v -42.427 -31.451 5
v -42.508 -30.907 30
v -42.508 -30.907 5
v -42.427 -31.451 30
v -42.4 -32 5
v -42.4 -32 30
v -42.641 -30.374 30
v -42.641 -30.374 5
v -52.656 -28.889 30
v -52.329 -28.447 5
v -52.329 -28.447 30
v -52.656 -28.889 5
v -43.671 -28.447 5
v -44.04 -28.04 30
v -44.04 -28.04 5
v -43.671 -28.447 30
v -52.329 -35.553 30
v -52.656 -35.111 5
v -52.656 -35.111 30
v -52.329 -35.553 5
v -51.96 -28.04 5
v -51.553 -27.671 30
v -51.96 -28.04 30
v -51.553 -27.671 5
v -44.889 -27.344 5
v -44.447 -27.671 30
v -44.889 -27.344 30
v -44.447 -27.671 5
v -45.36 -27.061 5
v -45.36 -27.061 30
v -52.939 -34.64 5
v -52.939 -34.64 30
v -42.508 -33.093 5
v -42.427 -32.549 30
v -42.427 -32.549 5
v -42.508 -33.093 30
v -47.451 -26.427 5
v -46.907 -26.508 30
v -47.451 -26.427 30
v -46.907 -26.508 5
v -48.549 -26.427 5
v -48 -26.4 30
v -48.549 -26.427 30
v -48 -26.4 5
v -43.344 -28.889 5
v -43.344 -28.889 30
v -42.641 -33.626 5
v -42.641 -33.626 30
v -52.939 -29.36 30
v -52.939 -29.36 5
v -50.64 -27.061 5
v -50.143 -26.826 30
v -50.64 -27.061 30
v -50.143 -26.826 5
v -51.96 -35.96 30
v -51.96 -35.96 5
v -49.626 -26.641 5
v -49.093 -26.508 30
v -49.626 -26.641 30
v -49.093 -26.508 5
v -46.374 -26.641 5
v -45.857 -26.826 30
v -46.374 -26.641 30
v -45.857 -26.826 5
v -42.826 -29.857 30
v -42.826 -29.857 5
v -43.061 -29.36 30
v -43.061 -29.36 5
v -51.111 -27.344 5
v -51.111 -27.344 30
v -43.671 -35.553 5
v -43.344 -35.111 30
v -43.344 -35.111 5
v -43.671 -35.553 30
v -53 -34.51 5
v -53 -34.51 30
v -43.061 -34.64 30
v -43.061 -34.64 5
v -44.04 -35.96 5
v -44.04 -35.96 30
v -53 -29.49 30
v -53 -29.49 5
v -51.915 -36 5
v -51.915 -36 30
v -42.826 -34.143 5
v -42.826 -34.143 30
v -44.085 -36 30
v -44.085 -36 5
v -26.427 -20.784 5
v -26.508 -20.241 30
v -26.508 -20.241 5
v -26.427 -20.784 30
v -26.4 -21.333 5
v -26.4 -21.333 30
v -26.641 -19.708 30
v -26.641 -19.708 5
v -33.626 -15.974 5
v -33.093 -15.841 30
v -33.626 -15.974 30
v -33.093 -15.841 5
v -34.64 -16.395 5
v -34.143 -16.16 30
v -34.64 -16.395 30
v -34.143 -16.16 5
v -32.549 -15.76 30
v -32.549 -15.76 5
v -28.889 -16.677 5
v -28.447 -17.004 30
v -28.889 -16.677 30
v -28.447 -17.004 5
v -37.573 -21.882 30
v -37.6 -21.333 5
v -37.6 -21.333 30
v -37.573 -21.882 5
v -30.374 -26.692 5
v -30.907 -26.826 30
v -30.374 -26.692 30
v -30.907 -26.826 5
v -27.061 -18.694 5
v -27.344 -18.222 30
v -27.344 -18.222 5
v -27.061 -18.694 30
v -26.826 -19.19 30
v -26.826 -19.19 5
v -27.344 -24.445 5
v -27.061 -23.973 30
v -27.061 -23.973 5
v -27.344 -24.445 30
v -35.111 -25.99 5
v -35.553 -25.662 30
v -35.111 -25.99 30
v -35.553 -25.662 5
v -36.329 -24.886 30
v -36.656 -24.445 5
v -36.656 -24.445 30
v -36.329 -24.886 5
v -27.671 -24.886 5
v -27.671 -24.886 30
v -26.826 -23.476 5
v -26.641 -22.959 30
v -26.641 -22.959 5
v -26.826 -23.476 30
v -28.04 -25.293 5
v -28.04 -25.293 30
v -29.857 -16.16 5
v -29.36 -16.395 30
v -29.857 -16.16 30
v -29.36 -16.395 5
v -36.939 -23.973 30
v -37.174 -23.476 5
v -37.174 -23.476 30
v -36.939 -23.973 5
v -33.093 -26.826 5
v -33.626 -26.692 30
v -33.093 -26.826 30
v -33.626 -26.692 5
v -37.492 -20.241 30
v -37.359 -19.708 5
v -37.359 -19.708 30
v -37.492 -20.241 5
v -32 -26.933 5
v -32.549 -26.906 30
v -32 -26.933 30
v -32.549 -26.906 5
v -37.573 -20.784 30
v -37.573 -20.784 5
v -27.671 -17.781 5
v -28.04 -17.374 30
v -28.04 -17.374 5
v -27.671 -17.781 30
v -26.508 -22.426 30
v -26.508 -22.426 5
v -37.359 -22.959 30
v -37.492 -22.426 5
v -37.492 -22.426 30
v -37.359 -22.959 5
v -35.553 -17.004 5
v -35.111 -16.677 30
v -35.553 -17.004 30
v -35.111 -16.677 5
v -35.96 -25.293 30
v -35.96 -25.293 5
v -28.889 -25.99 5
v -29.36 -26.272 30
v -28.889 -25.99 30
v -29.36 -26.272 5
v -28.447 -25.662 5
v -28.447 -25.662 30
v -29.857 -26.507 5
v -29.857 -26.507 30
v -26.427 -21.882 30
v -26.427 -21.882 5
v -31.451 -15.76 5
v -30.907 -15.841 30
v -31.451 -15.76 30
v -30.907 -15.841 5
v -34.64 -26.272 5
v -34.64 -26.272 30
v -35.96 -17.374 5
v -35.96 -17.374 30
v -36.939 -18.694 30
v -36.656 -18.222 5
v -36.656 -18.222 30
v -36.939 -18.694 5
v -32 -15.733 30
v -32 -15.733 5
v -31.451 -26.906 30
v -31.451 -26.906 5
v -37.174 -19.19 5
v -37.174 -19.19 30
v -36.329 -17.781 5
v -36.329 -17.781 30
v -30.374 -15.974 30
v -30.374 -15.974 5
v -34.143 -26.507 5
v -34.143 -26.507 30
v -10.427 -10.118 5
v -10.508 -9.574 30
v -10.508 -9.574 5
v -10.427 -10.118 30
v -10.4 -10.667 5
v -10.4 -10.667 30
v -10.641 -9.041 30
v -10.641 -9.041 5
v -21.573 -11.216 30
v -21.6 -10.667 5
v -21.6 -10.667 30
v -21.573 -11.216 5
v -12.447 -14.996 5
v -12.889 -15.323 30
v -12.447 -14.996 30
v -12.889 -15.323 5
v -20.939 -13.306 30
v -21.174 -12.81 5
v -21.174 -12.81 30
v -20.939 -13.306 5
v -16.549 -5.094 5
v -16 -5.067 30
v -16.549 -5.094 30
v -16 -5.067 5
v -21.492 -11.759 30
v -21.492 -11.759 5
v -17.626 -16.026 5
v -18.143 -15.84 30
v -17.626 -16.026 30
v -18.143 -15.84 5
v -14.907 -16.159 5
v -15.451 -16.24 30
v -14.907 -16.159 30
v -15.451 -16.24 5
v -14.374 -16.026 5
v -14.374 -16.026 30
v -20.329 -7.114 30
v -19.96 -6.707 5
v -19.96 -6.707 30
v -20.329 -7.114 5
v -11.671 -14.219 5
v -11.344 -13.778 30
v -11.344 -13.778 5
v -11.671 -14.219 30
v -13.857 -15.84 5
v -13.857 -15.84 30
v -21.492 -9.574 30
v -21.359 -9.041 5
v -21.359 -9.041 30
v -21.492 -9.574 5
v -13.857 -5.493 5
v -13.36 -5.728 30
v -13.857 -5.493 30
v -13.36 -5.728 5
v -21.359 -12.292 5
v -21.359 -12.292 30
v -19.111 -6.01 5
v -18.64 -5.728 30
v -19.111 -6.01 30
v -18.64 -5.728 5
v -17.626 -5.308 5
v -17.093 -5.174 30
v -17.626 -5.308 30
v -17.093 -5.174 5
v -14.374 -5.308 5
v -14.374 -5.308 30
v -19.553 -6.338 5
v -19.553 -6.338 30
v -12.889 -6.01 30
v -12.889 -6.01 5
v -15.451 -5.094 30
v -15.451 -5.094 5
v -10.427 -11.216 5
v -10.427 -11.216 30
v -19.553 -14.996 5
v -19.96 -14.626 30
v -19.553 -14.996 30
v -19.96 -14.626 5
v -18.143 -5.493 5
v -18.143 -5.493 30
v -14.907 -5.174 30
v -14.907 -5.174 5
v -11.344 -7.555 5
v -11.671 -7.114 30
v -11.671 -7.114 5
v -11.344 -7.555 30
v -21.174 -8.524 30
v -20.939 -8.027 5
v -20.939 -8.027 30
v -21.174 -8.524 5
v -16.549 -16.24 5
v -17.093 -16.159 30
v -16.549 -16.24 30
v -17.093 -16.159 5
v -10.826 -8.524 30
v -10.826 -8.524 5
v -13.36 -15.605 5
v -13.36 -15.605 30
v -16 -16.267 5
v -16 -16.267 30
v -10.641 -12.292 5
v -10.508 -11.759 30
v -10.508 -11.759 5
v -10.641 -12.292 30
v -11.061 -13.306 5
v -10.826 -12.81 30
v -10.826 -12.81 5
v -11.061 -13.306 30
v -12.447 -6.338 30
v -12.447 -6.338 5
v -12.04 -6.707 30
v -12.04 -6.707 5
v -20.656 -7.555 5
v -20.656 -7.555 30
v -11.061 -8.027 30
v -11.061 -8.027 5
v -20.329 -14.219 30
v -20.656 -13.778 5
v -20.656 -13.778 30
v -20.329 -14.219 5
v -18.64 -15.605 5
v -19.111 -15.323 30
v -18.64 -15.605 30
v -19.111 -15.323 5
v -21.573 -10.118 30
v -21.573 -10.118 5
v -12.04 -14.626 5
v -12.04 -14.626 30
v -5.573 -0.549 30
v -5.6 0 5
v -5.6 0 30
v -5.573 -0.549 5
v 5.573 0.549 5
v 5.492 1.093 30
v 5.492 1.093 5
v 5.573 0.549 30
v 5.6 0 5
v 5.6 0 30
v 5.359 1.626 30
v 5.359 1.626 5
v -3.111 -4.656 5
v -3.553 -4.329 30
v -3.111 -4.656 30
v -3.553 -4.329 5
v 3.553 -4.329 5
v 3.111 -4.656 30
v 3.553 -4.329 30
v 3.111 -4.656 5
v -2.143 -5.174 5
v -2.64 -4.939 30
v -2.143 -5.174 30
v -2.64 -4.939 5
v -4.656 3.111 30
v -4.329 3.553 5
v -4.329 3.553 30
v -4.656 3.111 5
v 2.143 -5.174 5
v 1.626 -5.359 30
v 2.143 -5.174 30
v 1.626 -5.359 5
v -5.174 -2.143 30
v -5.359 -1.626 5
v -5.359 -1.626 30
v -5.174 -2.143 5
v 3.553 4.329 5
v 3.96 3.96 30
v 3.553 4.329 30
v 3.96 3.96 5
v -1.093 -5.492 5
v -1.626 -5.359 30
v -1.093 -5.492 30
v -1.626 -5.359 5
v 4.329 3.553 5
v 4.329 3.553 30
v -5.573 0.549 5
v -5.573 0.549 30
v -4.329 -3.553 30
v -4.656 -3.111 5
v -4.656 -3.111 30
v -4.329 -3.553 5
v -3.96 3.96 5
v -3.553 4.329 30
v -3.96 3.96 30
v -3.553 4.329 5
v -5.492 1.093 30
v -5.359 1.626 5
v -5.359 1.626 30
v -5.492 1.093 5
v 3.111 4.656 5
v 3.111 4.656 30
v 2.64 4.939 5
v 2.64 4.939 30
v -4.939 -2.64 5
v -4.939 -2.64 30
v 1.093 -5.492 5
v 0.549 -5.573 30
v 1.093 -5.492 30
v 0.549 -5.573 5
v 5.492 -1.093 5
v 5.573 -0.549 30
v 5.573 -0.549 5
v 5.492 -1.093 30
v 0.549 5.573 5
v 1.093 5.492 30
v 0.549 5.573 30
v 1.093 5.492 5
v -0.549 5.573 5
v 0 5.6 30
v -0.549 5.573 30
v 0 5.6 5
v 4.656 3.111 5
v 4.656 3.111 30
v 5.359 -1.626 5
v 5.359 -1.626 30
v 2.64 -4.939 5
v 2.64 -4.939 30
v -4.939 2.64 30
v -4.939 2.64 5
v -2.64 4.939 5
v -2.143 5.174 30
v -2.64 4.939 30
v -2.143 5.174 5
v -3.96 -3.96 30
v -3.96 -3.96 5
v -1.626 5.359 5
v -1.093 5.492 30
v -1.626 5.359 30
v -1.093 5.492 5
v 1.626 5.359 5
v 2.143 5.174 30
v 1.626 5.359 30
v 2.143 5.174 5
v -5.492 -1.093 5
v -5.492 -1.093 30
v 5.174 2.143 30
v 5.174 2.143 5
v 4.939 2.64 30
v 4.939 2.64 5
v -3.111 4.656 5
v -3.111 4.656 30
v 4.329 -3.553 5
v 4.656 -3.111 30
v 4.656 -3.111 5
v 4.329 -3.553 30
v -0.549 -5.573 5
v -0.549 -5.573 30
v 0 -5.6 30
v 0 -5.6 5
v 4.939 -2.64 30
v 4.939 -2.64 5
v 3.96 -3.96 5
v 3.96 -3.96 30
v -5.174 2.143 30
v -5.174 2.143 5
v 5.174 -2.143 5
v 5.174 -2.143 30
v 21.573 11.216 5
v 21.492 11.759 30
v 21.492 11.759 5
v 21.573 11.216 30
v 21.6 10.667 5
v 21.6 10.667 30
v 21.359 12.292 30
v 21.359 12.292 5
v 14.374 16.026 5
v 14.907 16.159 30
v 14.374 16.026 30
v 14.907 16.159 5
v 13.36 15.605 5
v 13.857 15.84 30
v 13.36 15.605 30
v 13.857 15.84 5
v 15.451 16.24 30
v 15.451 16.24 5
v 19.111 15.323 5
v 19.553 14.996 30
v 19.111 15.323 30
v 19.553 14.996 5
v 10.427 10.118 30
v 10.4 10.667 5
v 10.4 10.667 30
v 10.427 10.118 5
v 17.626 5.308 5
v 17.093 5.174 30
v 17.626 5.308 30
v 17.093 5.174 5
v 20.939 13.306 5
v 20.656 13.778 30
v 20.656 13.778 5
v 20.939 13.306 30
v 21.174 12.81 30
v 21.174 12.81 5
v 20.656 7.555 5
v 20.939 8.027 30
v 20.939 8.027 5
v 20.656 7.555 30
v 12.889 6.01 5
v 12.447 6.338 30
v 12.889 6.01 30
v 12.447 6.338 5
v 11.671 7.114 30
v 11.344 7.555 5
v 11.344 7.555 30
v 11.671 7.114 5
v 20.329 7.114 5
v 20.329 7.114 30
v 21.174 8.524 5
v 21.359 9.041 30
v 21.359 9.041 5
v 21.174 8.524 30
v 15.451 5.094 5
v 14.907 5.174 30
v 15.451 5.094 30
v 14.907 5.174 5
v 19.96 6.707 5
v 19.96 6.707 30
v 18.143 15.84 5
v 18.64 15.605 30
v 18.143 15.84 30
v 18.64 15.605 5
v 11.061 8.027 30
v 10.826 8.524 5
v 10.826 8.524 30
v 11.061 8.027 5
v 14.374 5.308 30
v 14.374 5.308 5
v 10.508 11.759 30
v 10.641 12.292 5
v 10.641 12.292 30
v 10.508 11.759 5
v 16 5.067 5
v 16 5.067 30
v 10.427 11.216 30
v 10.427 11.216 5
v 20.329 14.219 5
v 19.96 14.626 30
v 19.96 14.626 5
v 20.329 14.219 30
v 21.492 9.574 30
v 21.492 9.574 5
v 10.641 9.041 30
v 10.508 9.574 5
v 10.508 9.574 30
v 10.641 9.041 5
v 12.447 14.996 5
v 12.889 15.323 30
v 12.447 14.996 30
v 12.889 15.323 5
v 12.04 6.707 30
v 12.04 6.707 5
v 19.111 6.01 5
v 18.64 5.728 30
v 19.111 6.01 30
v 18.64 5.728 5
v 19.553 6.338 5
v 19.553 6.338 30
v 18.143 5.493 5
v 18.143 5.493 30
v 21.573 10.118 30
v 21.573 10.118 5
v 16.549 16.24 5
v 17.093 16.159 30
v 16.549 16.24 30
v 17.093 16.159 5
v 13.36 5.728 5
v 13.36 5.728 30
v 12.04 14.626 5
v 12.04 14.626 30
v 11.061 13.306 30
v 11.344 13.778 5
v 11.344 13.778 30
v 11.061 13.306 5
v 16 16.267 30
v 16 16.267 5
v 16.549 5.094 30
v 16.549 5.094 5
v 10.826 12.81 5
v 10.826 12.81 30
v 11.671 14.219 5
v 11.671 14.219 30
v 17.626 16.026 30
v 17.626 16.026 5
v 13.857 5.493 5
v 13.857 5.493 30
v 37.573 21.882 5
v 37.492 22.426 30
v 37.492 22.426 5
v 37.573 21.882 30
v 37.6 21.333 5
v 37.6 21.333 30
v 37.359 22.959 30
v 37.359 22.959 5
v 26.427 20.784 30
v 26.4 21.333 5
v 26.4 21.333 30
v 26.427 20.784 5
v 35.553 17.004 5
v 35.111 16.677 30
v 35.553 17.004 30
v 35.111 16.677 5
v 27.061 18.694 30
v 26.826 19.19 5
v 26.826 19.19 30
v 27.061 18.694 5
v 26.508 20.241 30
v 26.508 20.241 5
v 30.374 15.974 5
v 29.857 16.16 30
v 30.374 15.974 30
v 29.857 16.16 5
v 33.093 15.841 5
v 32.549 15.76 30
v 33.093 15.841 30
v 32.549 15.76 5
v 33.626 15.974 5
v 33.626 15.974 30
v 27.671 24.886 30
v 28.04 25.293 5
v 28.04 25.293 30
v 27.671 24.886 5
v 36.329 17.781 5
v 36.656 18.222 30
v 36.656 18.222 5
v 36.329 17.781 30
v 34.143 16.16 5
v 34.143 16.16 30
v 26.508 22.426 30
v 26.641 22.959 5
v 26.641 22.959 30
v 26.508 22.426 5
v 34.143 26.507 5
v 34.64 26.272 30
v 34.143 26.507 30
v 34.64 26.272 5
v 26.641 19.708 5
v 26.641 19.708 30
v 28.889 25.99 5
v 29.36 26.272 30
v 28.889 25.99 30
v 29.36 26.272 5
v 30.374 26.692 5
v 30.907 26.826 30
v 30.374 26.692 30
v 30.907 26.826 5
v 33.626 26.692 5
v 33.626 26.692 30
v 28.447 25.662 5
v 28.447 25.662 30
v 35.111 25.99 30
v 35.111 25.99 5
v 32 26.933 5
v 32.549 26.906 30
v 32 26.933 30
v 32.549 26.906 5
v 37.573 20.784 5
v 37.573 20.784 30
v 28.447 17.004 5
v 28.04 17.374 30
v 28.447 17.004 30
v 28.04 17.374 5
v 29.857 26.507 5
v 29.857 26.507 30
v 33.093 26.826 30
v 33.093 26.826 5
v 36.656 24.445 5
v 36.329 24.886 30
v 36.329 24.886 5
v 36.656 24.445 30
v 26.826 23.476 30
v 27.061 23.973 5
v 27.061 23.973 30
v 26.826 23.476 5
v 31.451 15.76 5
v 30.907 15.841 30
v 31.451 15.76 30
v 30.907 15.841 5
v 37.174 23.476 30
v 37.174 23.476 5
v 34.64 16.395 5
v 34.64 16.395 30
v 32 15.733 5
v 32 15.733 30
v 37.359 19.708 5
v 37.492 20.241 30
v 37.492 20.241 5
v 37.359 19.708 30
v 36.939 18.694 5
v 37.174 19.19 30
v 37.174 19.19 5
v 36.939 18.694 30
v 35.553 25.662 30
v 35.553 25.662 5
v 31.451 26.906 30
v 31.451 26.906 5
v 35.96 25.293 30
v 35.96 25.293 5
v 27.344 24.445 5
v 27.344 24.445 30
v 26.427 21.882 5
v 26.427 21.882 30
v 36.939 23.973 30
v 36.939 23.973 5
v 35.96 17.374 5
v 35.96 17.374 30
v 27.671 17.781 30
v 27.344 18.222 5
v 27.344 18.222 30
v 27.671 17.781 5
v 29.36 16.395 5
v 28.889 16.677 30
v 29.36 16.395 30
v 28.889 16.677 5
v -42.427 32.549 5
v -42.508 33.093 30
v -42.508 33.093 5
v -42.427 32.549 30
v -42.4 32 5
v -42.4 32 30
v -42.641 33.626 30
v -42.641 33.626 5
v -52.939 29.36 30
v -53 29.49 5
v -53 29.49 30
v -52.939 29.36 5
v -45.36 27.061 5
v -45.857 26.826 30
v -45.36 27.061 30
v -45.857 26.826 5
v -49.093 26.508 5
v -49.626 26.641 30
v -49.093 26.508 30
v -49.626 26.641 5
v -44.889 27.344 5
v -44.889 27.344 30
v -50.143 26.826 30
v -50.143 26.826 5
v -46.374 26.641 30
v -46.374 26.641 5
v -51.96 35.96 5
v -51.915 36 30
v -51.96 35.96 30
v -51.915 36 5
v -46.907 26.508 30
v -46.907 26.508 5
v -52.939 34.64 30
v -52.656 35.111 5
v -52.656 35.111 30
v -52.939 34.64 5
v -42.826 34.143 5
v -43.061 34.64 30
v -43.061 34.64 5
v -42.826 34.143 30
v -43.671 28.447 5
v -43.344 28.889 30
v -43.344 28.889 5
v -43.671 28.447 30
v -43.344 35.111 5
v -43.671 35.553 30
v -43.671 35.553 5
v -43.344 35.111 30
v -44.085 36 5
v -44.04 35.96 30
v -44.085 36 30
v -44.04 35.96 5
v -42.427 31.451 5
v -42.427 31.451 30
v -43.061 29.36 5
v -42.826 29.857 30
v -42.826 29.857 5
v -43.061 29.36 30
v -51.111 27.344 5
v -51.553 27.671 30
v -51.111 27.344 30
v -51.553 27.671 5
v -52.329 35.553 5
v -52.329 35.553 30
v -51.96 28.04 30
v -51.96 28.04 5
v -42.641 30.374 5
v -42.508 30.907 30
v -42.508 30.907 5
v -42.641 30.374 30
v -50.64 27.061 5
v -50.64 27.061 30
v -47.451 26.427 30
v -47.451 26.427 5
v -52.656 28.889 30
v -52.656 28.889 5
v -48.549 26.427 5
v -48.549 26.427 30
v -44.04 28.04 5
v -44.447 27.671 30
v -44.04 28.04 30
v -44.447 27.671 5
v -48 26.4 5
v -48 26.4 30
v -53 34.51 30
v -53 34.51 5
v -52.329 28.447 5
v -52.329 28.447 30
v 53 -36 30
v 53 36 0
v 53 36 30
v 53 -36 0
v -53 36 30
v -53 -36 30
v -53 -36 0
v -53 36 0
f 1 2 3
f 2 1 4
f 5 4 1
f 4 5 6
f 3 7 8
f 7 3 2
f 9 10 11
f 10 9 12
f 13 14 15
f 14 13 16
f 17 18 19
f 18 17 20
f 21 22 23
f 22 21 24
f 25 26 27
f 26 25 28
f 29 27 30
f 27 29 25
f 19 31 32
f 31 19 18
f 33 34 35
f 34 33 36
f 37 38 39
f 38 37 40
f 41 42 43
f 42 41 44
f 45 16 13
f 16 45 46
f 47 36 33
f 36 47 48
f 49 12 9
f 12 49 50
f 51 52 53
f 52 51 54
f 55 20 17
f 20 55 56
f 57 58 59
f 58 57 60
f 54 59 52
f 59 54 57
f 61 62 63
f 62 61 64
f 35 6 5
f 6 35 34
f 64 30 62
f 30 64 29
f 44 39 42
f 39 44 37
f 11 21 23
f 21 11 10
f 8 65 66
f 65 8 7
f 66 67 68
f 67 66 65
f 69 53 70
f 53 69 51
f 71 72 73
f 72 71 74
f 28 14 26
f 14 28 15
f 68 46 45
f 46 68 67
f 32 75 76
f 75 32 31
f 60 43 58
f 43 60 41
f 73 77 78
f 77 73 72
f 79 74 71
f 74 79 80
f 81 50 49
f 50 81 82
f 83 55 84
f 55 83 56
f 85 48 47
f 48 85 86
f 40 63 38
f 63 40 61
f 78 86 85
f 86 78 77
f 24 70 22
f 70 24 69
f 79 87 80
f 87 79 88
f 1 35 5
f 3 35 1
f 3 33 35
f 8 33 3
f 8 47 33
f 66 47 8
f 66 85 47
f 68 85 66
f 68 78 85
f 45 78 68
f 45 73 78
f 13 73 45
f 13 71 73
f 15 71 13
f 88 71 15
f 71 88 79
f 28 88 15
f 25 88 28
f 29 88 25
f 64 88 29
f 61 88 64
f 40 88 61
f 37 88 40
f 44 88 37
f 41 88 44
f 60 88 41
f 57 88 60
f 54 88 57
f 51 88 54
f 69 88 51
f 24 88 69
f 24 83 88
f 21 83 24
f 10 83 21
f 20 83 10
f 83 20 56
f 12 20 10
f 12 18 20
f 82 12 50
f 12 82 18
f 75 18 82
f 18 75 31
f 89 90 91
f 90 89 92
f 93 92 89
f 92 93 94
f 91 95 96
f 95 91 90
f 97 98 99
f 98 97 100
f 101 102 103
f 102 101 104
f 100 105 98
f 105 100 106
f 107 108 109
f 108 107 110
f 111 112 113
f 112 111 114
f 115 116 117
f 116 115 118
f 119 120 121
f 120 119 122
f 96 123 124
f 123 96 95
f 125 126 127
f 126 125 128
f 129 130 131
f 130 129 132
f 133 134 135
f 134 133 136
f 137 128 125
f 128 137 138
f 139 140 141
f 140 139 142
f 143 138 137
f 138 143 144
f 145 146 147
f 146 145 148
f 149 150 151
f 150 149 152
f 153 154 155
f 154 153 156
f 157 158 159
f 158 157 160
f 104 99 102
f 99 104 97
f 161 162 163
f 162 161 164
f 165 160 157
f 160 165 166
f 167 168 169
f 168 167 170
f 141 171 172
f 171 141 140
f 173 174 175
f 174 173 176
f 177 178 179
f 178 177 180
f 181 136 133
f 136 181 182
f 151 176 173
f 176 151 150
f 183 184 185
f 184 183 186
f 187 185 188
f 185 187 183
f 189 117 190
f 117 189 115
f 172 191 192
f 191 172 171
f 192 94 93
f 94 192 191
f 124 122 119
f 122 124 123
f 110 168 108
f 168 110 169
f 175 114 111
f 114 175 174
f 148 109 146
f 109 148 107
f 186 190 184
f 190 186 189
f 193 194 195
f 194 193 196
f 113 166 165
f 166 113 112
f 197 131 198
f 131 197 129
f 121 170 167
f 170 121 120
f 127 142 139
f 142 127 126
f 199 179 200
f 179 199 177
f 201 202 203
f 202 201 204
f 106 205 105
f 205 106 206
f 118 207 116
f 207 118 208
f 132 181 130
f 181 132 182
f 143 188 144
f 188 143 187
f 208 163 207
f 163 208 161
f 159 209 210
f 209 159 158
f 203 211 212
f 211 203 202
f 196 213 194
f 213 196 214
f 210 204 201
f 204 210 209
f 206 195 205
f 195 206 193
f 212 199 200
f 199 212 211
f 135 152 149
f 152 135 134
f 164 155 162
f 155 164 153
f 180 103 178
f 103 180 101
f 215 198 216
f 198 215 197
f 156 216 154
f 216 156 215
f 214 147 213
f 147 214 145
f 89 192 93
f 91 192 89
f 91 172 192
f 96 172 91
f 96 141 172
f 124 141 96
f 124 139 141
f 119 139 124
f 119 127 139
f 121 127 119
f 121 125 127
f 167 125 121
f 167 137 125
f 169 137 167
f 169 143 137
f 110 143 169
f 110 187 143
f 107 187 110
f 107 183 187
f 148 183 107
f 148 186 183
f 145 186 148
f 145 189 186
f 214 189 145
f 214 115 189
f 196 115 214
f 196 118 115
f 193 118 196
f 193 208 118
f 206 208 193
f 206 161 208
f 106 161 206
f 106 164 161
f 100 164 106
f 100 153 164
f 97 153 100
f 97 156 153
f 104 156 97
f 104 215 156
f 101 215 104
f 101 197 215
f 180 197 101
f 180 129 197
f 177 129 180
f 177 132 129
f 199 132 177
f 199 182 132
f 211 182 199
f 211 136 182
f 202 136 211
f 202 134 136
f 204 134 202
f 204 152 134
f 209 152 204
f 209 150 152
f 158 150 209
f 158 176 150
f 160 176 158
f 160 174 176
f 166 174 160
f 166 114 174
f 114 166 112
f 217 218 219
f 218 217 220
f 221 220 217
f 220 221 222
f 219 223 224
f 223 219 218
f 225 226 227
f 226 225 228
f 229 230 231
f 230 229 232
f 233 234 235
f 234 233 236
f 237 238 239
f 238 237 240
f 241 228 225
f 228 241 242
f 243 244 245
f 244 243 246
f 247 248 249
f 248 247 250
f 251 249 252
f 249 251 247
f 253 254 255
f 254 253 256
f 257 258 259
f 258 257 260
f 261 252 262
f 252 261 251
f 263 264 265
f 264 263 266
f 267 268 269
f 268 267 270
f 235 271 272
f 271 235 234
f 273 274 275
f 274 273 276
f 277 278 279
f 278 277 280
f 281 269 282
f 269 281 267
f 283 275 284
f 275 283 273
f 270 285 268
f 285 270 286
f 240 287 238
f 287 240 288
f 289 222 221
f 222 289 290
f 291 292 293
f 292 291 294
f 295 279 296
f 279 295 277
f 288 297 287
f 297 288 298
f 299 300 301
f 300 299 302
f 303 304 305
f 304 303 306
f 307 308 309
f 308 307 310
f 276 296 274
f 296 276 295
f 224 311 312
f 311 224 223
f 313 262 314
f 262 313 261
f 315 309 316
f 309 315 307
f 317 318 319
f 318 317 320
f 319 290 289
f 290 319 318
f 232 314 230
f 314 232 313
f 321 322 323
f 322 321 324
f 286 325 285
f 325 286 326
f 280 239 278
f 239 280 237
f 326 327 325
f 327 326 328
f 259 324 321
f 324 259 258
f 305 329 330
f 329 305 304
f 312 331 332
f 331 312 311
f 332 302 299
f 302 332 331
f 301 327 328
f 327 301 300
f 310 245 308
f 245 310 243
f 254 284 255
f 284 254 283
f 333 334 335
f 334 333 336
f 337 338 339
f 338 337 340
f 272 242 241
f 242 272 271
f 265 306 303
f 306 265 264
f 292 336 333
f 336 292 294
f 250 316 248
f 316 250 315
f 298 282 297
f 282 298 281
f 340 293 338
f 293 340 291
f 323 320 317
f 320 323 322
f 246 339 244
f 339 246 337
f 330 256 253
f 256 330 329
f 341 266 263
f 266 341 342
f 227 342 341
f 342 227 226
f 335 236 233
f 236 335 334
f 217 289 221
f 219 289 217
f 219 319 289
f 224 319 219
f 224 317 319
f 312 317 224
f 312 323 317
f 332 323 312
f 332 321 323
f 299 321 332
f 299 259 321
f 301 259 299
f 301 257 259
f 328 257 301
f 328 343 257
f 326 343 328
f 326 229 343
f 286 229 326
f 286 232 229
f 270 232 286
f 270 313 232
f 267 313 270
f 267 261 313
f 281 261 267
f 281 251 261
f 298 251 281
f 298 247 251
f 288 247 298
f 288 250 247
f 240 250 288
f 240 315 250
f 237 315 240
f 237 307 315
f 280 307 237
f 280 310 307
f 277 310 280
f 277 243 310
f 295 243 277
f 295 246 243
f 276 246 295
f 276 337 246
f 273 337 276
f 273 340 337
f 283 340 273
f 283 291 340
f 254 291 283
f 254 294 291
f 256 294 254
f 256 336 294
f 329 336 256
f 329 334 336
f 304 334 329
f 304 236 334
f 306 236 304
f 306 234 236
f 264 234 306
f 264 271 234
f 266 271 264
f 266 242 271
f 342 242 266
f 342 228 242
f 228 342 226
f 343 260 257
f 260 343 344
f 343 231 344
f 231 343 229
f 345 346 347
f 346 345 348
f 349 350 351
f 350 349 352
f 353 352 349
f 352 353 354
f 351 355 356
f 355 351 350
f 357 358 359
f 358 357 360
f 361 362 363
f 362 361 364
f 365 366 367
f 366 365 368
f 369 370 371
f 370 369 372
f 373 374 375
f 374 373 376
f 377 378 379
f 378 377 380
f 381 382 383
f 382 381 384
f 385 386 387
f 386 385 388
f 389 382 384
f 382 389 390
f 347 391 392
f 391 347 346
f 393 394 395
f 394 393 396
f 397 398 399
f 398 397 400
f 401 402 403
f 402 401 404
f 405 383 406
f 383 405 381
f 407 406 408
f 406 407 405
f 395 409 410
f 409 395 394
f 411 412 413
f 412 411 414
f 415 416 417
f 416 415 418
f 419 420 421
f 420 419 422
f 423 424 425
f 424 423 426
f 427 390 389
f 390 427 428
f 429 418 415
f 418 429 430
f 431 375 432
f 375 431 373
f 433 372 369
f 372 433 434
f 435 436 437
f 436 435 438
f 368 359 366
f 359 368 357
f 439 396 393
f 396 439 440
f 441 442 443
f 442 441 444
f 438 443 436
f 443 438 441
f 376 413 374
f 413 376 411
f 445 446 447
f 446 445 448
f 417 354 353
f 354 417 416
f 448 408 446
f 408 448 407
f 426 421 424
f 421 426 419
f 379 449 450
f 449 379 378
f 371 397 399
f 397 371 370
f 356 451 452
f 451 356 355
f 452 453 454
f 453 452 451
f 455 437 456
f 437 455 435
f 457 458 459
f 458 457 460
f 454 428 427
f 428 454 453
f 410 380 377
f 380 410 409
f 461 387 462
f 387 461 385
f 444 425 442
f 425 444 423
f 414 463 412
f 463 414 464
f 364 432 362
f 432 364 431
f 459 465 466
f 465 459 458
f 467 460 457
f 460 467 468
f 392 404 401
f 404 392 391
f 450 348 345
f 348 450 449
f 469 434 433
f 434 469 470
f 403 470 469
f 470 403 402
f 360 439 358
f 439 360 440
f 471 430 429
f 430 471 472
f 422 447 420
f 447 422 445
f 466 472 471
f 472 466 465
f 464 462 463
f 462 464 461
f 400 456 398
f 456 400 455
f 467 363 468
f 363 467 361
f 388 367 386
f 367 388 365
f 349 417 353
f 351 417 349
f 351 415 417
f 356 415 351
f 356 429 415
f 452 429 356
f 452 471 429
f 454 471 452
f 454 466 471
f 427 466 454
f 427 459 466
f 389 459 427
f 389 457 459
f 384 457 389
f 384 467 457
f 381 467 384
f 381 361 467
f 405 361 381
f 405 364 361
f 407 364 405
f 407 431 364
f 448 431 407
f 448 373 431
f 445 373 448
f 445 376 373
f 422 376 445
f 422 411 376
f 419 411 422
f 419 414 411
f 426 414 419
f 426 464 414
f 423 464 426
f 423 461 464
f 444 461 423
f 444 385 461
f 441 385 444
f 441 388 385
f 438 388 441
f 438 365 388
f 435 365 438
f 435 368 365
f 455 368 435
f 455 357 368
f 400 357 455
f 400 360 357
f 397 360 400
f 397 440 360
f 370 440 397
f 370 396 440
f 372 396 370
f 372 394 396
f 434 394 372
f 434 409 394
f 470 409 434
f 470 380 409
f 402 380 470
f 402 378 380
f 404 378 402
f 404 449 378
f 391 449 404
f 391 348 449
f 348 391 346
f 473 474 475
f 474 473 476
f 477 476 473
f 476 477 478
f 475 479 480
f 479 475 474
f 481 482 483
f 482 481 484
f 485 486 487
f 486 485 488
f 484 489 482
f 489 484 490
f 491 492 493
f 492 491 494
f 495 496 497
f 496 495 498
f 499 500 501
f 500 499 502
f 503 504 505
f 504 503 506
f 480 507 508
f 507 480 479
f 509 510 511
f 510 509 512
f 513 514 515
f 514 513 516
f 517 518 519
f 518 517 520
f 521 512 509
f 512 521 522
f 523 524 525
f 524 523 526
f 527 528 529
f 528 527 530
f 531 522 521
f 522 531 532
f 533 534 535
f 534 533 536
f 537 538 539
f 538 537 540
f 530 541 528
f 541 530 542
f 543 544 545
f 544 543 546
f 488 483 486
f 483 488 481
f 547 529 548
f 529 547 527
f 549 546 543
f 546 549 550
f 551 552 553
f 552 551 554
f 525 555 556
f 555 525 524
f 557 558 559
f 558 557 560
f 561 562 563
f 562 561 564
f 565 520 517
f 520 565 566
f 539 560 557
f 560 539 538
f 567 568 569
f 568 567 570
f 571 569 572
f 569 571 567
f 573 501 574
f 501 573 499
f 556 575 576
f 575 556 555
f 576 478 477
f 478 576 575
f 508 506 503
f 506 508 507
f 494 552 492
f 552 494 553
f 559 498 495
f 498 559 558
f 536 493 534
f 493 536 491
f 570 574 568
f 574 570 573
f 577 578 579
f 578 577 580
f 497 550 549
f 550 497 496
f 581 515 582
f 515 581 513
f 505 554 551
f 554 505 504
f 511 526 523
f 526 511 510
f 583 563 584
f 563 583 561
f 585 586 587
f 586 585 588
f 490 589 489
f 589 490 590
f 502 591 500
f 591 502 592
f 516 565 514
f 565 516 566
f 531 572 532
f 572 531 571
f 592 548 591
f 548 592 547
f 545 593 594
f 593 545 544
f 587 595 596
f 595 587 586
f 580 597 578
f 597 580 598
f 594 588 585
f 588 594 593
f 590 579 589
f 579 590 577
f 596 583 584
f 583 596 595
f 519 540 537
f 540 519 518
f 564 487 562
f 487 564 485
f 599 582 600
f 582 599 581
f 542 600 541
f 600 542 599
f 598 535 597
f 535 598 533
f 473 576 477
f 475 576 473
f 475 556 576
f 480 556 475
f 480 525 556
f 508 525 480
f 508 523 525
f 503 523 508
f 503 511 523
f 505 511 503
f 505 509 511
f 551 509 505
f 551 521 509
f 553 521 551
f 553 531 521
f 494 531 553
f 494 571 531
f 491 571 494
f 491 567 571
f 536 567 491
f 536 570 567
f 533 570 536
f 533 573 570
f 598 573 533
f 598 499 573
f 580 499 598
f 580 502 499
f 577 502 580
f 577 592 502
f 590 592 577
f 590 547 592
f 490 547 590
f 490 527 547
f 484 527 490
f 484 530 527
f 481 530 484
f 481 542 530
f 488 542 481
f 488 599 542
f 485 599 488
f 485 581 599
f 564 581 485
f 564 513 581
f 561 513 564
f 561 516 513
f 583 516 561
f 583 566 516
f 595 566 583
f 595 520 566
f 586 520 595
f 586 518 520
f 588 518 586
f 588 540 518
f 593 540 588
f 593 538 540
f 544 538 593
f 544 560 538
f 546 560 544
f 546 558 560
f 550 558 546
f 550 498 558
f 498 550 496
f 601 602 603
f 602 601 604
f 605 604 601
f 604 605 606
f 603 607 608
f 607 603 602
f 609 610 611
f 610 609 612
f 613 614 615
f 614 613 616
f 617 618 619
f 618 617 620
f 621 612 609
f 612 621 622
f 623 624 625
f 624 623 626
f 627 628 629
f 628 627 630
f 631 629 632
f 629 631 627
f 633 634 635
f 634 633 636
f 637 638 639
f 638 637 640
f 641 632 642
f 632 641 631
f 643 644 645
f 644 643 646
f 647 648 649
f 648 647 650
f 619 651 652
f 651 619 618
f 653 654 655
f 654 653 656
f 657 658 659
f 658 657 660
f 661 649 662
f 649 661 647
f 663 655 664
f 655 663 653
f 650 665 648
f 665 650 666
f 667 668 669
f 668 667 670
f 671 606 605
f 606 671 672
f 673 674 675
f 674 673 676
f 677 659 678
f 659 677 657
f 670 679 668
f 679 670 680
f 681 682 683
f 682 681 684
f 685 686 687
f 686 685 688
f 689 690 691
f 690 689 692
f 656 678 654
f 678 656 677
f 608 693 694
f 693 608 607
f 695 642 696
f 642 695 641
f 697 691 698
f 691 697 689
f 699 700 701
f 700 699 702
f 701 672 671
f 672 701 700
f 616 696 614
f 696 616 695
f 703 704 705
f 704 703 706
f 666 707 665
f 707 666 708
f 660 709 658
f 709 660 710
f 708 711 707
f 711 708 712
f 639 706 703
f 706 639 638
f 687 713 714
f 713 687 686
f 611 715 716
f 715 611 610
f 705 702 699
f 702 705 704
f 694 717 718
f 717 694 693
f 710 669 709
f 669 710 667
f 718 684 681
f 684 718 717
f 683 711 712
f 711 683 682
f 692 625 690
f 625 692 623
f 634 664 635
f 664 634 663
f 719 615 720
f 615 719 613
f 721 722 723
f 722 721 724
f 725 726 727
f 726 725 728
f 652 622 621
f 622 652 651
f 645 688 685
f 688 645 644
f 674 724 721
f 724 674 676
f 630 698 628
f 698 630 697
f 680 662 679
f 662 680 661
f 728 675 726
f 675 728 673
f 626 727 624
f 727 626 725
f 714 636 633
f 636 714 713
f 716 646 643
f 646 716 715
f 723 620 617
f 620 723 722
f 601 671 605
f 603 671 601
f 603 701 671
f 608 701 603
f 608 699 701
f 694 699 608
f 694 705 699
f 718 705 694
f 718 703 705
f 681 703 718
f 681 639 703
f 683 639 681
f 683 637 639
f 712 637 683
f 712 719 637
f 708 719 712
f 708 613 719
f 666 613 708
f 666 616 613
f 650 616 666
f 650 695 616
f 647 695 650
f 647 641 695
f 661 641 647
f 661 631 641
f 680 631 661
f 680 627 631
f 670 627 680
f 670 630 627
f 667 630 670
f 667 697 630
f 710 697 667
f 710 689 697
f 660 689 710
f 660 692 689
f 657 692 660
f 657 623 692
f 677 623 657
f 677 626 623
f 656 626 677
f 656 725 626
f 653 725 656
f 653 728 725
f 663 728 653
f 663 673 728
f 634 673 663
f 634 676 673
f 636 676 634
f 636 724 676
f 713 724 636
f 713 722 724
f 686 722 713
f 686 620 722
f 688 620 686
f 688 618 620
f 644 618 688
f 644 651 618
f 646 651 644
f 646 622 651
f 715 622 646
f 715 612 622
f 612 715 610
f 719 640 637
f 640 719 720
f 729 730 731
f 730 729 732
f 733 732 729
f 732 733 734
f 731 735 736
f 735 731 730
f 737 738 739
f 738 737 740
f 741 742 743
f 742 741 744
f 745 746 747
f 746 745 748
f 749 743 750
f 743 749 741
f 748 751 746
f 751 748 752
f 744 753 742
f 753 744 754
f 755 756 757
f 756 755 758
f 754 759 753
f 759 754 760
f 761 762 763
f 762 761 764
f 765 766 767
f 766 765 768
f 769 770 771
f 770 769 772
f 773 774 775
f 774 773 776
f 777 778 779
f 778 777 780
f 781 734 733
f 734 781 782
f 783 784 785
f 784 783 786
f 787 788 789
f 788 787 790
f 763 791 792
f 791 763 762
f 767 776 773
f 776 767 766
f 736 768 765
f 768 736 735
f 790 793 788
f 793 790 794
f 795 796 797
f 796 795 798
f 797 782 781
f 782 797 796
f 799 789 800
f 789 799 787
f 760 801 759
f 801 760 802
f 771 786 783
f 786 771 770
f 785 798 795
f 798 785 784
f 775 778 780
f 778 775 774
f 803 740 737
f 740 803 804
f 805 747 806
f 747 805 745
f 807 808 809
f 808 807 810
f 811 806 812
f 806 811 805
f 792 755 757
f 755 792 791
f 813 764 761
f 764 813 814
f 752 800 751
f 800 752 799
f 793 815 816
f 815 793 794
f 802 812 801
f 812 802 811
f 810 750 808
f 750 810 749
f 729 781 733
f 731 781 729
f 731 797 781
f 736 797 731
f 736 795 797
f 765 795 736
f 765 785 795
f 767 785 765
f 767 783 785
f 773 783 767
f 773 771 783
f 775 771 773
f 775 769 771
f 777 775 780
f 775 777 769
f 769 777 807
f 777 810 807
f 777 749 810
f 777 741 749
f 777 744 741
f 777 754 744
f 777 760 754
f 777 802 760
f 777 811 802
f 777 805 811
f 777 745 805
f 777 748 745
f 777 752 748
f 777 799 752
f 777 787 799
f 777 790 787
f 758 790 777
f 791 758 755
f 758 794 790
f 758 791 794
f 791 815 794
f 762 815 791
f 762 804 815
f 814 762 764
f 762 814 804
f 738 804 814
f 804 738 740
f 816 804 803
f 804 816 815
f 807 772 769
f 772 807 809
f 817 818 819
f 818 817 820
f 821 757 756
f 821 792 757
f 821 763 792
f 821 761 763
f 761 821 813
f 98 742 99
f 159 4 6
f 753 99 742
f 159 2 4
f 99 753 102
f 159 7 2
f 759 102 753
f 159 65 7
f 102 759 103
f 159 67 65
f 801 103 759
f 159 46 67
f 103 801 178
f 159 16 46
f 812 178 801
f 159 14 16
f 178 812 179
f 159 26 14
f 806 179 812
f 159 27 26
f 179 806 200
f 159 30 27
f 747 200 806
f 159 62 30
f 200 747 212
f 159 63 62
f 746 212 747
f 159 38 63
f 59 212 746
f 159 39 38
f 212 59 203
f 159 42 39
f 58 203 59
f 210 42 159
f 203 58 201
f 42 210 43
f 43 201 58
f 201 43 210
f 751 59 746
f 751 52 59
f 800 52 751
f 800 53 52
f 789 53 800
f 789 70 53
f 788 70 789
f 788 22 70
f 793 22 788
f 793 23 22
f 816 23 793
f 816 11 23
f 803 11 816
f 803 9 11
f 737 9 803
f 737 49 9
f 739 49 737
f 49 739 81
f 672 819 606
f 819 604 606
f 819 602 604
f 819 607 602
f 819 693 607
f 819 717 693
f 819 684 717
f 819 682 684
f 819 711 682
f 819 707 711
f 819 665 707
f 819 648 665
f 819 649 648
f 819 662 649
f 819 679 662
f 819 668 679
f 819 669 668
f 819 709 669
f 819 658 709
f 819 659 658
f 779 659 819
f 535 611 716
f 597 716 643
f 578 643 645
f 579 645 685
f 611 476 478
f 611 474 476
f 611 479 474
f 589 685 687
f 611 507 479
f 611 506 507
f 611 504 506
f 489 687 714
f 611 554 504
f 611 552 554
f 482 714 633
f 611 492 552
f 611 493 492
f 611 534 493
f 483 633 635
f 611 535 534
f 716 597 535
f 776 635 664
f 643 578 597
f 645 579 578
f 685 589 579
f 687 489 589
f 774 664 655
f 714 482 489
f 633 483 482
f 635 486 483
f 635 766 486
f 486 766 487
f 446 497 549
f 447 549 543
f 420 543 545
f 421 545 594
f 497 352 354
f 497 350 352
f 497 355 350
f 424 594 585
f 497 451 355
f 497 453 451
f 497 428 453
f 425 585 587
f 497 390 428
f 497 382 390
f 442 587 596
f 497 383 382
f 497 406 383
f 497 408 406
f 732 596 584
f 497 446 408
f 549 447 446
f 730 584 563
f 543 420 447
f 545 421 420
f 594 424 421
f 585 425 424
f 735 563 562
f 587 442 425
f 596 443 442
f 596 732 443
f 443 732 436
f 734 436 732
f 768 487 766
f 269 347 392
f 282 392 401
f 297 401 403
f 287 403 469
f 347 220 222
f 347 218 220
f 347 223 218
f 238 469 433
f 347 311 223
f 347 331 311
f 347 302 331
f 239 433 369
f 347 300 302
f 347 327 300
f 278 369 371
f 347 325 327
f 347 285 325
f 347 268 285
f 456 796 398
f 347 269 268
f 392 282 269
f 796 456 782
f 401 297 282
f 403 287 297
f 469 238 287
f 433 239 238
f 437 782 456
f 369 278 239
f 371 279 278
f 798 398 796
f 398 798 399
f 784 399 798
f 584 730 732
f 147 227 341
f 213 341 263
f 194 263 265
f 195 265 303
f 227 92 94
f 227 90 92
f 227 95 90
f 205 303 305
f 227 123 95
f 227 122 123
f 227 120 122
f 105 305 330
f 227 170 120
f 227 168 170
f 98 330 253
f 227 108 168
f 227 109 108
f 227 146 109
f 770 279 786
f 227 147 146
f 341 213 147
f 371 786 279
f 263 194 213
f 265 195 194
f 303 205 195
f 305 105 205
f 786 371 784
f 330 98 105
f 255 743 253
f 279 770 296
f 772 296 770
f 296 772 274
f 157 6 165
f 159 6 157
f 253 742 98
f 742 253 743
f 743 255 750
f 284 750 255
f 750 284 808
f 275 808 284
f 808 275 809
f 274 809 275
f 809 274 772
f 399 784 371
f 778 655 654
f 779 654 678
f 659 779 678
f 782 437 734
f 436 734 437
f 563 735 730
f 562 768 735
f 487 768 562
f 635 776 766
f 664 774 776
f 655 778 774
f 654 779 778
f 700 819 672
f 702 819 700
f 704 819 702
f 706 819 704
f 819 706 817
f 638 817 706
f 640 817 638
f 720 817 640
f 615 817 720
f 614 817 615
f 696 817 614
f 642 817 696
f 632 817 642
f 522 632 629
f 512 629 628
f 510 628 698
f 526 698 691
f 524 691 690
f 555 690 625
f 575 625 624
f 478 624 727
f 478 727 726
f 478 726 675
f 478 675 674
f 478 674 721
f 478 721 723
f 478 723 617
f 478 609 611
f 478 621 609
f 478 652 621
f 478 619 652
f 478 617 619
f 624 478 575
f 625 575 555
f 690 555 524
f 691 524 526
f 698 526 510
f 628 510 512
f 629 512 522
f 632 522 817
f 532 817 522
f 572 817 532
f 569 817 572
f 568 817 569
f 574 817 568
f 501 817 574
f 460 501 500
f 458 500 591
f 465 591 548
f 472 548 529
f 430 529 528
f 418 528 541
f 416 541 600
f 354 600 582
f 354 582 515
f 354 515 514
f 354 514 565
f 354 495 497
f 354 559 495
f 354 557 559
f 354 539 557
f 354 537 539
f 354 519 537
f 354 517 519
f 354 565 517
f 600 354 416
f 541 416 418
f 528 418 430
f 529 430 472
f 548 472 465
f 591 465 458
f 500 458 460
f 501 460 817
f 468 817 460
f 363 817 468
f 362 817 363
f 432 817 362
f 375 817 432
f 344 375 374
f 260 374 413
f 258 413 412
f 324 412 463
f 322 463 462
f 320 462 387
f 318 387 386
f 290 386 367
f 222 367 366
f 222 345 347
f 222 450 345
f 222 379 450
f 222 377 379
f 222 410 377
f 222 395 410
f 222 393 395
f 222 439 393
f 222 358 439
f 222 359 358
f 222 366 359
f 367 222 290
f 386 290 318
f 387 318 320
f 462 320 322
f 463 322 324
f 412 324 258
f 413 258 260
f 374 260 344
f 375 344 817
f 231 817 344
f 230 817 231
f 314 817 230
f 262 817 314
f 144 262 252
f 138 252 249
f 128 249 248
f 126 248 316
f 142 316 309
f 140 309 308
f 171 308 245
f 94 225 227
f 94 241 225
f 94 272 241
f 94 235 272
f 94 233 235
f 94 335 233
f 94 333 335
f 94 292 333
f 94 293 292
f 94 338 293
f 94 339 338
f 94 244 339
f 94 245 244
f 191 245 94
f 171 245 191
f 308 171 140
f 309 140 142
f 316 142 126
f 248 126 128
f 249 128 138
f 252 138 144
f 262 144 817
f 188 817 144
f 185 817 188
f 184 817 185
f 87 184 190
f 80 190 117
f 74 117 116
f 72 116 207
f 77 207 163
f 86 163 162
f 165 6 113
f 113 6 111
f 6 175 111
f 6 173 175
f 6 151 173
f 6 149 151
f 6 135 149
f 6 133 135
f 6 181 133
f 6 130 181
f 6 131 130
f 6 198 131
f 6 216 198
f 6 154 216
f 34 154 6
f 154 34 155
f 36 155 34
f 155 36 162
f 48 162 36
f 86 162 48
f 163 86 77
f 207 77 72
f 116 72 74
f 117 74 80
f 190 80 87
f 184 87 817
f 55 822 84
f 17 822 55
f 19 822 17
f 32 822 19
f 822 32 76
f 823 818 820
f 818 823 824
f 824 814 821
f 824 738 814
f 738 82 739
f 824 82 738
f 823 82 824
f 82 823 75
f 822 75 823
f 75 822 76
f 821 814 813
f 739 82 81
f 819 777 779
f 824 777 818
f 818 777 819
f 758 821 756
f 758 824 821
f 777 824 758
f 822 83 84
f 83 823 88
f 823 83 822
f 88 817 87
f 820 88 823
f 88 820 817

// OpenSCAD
// Bench rack for 1.5 mL microcentrifuge tubes
// Print orientation: flat on bed, holes open at the top

// ---- Block dimensions ----
block_len   = 106;   // block length along X (mm)
block_wid   = 72;    // block width along Y (mm)
block_ht    = 30;    // block height along Z (mm)

// ---- Hole dimensions ----
hole_d      = 11.2;  // hole diameter (mm)
hole_depth  = 25;    // hole depth from top surface (mm)
hole_pitch  = 16;    // centre-to-centre spacing in X and Y (mm)
hole_count  = 24;    // total number of holes (4 rows x 6 cols)

// ---- Derived ----
floor_t     = block_ht - hole_depth;  // solid floor thickness = 5 mm
overcut     = 0.5;                     // extension past top face for clean cut

$fn = 64;

difference() {
    // Main block
    translate([-block_len/2, -block_wid/2, 0])
        cube([block_len, block_wid, block_ht]);

    // Hole grid, centred on the block
    for (i = [0 : hole_count - 1]) {
        x = (i % 6)     * hole_pitch - 3 * hole_pitch;   // 6 holes along X
        y = (i / 6) * 4 * hole_pitch - 2 * hole_pitch;   // 4 rows along Y
        translate([x, y, floor_t])
            cylinder(d = hole_d, h = hole_depth + overcut);
    }
}
